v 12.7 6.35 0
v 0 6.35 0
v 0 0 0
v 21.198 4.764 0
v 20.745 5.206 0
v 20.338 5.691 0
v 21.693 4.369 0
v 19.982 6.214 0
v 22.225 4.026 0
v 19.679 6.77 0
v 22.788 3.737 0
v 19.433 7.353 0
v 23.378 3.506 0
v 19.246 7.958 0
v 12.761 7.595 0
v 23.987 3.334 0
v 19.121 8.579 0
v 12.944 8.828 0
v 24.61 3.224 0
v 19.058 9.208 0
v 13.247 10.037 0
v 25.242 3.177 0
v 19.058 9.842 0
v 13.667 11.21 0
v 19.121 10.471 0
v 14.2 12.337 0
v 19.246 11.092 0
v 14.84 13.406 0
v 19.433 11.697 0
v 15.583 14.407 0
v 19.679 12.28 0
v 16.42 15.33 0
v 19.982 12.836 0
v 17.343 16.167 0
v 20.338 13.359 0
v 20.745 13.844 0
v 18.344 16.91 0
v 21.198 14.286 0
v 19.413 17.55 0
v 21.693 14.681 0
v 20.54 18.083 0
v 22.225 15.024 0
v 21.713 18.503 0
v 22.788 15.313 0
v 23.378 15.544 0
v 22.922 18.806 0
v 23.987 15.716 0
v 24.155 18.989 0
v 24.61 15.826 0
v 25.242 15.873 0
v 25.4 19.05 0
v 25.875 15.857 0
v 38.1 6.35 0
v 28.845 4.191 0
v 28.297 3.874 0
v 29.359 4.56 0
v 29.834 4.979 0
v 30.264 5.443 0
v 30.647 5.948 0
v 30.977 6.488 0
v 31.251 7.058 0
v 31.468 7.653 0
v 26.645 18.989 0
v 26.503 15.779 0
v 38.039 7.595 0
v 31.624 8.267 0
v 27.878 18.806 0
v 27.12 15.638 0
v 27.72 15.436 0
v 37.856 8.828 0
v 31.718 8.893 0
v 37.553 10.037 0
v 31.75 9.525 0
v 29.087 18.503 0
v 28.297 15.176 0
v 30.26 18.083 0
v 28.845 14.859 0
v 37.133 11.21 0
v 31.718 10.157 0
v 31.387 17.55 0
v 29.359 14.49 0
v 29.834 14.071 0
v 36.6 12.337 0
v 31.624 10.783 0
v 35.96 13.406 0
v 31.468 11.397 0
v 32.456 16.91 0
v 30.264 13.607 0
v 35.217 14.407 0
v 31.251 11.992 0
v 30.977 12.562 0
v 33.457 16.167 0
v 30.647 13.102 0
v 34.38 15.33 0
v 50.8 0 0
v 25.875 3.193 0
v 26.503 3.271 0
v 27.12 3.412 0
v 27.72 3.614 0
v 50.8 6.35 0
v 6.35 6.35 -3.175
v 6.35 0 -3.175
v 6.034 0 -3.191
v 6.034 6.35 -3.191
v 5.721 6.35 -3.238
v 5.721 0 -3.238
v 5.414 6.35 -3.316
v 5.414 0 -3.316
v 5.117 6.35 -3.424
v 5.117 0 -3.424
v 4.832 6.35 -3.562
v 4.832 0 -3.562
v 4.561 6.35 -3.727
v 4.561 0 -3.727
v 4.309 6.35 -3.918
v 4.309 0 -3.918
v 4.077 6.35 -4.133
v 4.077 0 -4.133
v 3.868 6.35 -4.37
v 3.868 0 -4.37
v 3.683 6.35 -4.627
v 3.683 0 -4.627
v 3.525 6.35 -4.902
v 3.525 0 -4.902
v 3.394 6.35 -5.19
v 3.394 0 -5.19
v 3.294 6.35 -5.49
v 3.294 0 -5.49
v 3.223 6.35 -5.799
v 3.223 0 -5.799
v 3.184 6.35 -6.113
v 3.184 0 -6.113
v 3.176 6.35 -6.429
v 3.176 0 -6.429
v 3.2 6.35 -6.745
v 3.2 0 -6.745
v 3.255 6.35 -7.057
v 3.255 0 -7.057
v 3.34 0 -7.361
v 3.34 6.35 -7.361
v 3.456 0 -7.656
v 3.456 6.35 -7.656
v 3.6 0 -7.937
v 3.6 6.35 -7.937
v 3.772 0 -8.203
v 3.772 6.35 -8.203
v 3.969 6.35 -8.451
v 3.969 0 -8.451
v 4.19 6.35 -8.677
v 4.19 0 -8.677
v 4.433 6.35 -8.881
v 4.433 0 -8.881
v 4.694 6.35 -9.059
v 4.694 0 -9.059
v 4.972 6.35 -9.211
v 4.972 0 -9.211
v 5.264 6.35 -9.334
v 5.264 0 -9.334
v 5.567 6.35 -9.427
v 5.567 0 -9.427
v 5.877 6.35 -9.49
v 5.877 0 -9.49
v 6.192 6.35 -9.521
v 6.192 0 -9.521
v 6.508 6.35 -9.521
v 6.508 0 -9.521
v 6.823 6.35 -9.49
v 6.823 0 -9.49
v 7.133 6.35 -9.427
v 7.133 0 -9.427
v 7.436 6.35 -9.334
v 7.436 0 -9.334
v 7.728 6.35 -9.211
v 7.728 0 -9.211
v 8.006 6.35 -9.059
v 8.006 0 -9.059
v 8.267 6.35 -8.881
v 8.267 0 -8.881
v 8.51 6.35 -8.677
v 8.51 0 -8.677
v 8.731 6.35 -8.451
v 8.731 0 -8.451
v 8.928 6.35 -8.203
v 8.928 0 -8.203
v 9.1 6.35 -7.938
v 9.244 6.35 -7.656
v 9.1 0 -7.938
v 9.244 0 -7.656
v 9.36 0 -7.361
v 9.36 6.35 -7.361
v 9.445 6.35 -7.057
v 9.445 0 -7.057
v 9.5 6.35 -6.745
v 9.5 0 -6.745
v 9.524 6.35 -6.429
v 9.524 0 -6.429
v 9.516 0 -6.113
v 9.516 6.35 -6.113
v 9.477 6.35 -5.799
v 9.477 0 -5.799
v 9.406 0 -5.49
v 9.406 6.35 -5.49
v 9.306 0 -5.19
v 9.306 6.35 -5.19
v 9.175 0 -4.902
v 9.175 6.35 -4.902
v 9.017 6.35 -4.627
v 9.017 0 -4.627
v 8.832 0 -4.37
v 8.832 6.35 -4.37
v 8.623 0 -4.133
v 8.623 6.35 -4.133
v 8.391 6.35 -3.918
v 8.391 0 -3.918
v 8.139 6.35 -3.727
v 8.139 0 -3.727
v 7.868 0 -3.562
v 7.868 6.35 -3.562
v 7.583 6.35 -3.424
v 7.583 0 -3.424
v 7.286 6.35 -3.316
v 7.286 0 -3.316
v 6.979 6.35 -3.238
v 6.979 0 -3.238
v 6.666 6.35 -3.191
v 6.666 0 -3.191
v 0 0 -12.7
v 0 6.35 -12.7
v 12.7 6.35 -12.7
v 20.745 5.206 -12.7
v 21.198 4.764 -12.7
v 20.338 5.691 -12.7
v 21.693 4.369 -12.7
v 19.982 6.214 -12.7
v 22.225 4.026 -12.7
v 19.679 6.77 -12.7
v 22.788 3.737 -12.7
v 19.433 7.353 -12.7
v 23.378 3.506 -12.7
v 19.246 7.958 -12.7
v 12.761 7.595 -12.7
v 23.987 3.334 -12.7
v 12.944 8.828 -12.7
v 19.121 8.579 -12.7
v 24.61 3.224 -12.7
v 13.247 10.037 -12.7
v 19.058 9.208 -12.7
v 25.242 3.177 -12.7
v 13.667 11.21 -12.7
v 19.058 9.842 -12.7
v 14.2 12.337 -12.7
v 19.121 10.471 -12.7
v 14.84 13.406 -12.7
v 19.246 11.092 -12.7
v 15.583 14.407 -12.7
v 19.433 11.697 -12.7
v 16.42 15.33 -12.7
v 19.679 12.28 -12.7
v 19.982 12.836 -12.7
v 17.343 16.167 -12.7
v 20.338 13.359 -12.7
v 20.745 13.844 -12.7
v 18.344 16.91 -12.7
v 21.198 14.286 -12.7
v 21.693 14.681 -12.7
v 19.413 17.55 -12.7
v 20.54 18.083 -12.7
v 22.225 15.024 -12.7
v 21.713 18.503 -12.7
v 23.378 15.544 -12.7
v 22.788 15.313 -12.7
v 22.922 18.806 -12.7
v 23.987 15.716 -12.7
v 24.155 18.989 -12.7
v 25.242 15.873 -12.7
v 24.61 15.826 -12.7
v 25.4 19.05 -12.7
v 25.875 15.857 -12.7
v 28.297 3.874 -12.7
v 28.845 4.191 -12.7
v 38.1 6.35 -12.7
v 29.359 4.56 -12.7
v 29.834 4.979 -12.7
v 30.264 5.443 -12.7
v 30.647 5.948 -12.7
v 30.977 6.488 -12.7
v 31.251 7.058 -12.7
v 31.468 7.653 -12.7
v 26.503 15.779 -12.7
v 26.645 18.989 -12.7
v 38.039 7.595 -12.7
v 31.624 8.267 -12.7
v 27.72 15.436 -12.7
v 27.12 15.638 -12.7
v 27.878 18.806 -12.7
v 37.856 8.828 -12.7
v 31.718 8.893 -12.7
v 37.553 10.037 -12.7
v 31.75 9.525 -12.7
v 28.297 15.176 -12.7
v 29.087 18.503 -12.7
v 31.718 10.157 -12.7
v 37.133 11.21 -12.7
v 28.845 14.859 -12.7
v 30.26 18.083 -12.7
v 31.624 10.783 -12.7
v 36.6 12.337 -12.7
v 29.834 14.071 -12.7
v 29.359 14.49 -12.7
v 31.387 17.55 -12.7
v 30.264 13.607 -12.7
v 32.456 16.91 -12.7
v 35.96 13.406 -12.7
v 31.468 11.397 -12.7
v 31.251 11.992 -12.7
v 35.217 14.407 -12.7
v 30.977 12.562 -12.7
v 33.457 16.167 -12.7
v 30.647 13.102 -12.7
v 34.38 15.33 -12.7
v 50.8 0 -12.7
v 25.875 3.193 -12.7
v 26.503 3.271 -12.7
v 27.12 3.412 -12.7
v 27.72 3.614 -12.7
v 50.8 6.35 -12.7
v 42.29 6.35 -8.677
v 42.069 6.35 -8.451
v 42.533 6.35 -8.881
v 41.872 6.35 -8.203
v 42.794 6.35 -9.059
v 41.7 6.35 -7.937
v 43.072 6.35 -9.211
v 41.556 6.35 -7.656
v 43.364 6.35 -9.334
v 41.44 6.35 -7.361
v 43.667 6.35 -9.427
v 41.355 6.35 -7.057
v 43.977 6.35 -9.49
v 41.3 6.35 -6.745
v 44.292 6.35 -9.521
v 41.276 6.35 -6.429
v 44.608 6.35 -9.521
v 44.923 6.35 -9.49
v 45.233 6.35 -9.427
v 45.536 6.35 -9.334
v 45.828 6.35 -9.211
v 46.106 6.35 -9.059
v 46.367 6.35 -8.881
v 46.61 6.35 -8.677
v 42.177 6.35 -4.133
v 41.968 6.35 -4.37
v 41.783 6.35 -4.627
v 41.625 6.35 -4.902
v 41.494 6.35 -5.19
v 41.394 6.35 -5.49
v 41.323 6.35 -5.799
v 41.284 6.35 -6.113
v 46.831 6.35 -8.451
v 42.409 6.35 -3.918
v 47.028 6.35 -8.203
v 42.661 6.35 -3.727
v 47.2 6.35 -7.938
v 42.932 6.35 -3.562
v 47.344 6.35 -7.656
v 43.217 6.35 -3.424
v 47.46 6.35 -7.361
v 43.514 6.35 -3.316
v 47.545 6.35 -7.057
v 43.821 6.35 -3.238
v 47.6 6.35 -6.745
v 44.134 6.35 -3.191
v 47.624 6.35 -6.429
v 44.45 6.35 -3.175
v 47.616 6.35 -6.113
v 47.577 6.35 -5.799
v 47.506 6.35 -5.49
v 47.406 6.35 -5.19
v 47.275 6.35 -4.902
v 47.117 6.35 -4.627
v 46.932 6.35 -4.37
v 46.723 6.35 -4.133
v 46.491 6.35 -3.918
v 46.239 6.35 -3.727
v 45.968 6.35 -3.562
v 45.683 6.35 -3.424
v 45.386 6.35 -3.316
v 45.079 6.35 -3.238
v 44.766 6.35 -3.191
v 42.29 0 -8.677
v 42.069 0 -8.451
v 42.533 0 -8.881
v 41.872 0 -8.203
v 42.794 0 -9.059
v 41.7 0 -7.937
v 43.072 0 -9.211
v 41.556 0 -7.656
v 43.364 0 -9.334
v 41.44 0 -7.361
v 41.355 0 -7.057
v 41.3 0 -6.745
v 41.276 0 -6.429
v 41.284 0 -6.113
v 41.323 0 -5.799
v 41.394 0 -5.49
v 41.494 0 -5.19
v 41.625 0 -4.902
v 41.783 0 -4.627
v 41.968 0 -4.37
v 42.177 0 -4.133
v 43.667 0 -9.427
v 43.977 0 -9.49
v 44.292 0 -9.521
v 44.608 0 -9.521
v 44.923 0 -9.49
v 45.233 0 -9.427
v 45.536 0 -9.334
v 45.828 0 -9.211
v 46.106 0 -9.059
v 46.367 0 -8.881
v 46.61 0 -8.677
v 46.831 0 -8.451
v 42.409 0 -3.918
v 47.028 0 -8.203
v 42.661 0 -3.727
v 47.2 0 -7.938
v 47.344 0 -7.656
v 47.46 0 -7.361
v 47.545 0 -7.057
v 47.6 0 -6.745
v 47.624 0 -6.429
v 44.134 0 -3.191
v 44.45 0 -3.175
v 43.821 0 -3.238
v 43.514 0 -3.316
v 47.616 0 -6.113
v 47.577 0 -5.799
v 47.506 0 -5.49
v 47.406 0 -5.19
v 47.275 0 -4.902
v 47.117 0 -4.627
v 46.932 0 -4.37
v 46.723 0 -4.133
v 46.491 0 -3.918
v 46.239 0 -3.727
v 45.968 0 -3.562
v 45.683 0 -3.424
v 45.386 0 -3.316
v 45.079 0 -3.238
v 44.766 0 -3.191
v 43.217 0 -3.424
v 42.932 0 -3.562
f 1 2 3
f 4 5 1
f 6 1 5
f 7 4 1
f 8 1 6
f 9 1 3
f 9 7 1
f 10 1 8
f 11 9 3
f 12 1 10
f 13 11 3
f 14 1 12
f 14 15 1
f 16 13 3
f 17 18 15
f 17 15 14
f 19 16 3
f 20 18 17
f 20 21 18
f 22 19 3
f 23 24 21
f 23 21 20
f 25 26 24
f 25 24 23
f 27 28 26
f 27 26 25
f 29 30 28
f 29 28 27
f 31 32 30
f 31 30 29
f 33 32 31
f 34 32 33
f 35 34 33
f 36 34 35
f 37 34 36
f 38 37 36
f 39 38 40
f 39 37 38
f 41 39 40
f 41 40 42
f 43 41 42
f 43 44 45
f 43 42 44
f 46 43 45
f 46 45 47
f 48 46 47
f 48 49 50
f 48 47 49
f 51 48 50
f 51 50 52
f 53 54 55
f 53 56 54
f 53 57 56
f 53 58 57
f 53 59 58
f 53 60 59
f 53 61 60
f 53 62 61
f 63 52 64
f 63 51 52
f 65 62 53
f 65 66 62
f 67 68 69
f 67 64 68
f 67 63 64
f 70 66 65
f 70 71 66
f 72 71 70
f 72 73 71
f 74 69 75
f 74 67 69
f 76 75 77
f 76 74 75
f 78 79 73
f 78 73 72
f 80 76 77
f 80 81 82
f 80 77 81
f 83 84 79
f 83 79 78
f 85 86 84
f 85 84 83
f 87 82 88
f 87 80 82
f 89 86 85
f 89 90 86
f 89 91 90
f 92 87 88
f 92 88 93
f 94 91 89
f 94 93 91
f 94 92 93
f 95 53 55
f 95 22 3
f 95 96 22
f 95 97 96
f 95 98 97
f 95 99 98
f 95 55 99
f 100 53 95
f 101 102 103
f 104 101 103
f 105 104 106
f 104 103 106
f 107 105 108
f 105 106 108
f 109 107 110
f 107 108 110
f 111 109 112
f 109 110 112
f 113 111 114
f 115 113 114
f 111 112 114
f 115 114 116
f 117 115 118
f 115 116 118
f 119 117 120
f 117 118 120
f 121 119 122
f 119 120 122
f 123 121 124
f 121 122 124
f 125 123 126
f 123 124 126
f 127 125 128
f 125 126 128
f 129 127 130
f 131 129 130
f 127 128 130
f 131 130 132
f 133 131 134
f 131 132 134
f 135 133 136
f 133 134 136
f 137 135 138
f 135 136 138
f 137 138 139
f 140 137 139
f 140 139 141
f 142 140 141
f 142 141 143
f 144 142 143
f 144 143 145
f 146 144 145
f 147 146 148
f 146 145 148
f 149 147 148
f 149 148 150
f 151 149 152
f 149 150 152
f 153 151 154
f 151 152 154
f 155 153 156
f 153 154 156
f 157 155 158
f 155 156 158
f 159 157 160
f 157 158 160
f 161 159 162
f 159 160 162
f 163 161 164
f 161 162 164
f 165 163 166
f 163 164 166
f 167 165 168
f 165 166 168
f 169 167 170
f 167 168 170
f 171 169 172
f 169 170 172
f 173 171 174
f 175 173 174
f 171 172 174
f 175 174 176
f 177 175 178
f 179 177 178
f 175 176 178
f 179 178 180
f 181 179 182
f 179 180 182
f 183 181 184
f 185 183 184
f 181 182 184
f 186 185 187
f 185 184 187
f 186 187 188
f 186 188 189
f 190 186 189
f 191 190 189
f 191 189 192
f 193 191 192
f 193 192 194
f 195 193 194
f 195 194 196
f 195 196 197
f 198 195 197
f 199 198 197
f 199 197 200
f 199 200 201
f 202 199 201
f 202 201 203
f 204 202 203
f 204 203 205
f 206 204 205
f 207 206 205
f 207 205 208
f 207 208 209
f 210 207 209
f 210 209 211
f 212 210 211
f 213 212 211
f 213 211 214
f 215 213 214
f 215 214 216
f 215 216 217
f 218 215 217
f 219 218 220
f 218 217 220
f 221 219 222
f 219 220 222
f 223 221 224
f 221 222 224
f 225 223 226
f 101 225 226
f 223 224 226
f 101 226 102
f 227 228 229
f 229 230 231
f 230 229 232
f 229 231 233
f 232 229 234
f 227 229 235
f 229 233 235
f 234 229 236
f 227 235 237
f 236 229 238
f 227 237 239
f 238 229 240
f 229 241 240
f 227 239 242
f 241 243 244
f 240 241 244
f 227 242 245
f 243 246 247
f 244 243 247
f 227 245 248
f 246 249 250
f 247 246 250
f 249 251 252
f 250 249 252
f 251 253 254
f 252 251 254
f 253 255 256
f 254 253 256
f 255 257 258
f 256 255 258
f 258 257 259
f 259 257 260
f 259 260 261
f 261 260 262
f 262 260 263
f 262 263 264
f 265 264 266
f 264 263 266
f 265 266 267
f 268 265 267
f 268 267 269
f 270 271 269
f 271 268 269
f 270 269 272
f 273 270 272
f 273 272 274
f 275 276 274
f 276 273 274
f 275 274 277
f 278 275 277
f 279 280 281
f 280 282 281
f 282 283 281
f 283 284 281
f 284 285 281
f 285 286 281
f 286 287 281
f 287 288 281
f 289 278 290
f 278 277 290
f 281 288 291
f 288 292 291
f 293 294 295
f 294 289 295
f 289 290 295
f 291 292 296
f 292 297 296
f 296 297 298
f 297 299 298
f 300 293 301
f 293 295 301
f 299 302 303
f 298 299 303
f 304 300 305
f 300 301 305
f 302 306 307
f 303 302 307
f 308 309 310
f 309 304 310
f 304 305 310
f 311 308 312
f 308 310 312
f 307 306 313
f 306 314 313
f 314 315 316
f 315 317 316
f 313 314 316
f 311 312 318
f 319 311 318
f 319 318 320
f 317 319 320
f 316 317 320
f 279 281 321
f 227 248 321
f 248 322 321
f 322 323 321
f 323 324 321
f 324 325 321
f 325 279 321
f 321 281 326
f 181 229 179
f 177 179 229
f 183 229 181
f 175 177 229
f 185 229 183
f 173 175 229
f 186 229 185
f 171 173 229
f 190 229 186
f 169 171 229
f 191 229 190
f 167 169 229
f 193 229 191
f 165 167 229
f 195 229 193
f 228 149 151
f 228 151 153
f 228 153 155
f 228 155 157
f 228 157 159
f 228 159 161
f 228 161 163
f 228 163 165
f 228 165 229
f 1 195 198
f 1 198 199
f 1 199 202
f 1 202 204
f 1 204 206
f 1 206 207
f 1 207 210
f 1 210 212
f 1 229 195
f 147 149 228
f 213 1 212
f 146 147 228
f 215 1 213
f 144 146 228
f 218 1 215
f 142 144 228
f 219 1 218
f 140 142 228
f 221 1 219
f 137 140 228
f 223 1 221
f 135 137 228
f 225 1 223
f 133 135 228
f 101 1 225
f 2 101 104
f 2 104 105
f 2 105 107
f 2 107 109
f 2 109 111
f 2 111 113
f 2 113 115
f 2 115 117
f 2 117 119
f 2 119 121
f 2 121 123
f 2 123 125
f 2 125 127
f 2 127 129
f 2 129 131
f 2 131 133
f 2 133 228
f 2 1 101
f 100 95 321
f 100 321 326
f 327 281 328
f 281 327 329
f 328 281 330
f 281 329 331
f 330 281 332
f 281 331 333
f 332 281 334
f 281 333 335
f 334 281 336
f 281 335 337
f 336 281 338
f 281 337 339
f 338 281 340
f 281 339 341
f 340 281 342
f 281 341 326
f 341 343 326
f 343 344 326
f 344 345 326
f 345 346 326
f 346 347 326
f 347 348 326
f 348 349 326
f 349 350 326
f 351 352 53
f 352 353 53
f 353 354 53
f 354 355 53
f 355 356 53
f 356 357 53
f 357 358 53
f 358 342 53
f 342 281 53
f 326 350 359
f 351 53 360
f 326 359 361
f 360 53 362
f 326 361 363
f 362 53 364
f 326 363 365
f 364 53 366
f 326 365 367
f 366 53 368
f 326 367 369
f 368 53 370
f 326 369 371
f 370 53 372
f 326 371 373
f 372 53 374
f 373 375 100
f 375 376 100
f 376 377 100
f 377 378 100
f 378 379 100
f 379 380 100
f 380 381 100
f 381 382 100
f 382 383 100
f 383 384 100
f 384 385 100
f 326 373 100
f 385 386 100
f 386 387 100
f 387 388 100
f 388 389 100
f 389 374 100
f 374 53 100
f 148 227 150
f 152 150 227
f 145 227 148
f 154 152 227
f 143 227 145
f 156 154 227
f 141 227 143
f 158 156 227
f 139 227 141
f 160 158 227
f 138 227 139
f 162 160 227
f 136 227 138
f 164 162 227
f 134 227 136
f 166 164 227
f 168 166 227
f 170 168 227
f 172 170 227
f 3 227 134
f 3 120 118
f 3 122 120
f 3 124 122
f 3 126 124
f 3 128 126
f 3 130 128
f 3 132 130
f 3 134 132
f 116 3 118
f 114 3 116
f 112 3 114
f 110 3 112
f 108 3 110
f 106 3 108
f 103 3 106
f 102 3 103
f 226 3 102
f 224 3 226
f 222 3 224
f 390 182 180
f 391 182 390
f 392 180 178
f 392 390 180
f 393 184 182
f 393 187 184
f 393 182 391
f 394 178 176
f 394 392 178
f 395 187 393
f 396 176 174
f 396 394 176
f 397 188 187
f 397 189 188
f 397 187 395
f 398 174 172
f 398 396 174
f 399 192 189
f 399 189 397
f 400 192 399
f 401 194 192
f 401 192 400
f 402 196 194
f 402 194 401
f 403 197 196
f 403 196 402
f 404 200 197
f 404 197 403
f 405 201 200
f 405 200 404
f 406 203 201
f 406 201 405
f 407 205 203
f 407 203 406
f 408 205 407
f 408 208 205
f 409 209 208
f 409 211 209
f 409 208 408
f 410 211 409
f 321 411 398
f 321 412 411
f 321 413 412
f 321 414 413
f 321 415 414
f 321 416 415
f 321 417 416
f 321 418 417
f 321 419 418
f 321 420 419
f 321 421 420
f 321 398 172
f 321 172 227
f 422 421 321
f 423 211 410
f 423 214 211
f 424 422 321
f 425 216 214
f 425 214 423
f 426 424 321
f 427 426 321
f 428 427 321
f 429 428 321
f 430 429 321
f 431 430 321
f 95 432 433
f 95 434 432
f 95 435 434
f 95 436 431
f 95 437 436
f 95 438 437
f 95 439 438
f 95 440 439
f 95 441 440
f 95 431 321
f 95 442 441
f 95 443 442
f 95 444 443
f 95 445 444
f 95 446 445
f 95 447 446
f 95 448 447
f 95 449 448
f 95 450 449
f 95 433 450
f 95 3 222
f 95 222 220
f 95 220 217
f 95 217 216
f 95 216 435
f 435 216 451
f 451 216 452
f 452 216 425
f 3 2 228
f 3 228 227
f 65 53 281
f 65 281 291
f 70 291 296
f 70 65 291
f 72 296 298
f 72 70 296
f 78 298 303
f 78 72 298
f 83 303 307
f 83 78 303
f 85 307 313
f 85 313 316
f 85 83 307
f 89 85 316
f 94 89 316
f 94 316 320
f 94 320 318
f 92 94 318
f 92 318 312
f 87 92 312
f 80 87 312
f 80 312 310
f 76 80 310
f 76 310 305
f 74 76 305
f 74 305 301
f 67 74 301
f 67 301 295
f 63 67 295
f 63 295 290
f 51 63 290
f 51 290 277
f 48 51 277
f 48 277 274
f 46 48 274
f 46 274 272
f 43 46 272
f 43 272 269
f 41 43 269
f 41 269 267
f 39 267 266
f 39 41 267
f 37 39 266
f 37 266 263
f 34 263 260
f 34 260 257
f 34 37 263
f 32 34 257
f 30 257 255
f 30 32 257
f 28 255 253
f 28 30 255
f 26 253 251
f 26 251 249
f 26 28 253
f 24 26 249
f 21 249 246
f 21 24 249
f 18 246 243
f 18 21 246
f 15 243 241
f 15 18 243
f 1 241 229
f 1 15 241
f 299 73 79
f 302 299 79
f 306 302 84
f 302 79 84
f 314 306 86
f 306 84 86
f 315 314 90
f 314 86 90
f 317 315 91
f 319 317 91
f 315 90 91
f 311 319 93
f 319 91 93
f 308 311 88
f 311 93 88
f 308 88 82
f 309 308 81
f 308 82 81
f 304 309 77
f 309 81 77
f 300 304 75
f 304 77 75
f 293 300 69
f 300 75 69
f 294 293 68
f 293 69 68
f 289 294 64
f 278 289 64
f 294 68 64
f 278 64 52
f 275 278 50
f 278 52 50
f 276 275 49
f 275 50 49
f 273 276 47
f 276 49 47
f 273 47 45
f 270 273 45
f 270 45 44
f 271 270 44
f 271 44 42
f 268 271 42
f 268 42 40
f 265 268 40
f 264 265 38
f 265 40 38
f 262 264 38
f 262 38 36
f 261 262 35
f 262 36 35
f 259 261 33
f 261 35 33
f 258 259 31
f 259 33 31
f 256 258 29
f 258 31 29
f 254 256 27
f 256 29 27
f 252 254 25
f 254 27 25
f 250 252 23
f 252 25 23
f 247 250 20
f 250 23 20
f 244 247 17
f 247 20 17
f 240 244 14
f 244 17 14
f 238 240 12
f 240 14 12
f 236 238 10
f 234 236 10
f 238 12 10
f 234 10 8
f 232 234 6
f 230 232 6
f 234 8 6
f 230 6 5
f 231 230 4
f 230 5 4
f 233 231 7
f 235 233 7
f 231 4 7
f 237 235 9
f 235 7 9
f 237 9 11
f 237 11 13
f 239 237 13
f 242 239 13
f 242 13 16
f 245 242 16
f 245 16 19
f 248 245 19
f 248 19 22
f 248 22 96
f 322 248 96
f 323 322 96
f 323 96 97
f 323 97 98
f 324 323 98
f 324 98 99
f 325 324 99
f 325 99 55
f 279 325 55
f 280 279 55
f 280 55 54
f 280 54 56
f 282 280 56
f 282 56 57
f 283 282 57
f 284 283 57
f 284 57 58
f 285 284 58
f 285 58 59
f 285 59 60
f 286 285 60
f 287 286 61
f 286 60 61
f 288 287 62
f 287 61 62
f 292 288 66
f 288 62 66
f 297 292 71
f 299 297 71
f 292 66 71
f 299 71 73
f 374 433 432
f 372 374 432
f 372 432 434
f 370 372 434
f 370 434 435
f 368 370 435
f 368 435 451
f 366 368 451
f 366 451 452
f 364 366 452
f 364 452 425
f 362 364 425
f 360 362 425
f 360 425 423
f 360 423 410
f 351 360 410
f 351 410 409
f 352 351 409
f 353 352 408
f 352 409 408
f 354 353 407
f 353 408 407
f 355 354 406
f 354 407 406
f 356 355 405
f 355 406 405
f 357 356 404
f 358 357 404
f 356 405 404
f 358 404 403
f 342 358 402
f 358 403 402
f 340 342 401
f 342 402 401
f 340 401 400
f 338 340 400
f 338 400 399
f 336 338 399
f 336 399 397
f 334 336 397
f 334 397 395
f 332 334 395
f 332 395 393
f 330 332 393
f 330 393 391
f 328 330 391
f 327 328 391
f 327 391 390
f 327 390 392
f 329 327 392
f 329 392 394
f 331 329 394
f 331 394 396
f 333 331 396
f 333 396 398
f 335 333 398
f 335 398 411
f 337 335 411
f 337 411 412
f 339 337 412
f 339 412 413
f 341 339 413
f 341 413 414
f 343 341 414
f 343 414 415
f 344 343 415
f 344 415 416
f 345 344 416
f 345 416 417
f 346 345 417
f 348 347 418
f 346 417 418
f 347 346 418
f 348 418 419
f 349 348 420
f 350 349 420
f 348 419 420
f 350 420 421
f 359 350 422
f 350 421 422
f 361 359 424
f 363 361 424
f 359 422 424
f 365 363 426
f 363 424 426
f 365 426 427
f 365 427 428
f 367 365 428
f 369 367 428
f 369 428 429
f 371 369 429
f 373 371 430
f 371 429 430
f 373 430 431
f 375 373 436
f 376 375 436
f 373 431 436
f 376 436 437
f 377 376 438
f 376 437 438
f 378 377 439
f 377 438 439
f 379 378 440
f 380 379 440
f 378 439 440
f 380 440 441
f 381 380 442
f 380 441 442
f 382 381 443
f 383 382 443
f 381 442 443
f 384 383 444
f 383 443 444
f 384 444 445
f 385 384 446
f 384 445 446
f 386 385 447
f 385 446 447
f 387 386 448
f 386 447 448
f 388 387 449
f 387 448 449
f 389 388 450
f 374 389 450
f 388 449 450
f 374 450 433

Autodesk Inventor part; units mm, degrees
ref_plane "YZ Plane" through (0, 0, 0) normal (1, 0, 0) x (0, 1, 0)
ref_plane "XZ Plane" through (0, 0, 0) normal (0, 1, 0) x (-1, 0, 0)
ref_plane "XY Plane" through (0, 0, 0) normal (0, 0, 1) x (1, 0, 0)
sketch "Sketch1" plane through (0, 0, 0) normal (0, 0, 1) x (1, 0, 0)
  line L0 (0, 0) -> (50.8, 0)
  line L1 (50.8, 0) -> (50.8, 6.35)
  line L2 (0, 6.35) -> (0, 0)
  arc A0 (38.1, 6.35) -> (12.7, 6.35) centre (25.4, 6.35) ccw
  line L3 (25.4, 6.35) -> (38.1, 6.35) construction
  line L4 (25.4, 6.35) -> (12.7, 6.35) construction
  line L5 (12.7, 6.35) -> (0, 6.35)
  line L6 (38.1, 6.35) -> (50.8, 6.35)
  circle A1 centre (25.4, 9.525) radius 6.35
  point P0 (25.4, 0)
  dimension "d0" = 50.8
  dimension "d2" = 12.7
  dimension "d3" = 180
  dimension "d4" = 6.35
  dimension "d5" = 12.7
  dimension "d6" = 9.525
extrude "Extrusion1" add sketch "Sketch1" against normal blind 12.7
sketch "Sketch2" plane through (0, 6.35, 0) normal (0, 1, 0) x (1, 0, 0)
  line L0 (0, 0) -> (0, 12.7) projected
  line L1 (50.8, 0) -> (50.8, 12.7) projected
  point P0 (6.35, 6.35)
  point P1 (44.45, 6.35)
  dimension "d9" = 6.35
  dimension "d10" = 6.35
hole "Hole1" at (6.35, 6.35, -6.35) at (44.45, 6.35, -6.35) direction (0, -1, 0) diameter 6.35 depth 25.4 tip angle 118
properties part number "axle bearing"
